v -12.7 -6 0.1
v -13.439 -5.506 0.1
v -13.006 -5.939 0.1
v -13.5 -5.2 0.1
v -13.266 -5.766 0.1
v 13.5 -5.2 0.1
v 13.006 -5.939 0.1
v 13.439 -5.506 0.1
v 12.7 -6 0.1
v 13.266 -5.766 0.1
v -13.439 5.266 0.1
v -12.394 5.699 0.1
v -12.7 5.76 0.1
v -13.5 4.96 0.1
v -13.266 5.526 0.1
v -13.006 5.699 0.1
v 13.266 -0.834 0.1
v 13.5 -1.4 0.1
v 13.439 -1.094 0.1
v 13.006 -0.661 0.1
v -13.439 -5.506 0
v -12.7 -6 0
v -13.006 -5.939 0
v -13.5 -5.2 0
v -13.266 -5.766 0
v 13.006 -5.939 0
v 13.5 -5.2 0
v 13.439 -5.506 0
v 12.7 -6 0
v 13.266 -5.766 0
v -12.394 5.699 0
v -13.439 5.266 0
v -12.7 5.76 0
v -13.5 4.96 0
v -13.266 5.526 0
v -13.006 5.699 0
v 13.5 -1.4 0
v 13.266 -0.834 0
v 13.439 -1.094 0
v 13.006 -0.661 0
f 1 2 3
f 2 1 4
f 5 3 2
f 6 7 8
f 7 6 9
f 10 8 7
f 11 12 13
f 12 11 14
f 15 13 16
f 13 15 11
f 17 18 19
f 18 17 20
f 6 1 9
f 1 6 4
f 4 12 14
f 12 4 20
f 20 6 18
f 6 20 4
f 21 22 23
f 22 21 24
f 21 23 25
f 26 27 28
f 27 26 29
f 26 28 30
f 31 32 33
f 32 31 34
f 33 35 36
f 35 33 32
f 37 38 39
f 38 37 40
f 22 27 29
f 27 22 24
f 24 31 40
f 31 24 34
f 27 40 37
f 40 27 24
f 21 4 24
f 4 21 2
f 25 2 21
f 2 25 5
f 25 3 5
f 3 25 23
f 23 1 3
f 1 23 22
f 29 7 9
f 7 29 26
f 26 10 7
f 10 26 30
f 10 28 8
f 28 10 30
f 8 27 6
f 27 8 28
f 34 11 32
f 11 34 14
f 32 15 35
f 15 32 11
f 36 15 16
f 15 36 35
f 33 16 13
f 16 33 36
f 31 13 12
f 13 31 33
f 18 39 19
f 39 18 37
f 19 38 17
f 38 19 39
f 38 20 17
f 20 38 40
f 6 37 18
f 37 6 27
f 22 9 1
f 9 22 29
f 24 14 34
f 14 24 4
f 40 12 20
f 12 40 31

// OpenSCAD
// file: ../p/5-16cyli.scad
use <../lib.scad>
function ldraw_lib__5_16cyli() = [
// 0 Cylinder 0.3125
// 0 Name: 5-16cyli.dat
// 0 Author: Philippe Hurbain [Philo]
// 0 !LDRAW_ORG Primitive UPDATE 2009-03
// 0 !LICENSE Licensed under CC BY 4.0 : see CAreadme.txt
// 
// 0 BFC CERTIFY CCW
  [0,"BFC","CERTIFY"],
  [0,"BFC","CCW"],
// 
// 0 !HISTORY 2009-12-29 [PTadmin] Official Update 2009-03
// 
// 
// 4 16 0.9239 0 0.3827 1 0 0 1 1 0 0.9239 1 0.3827
  [4,16,0.9239,0,0.3827,1,0,0,1,1,0,0.9239,1,0.3827],
// 4 16 0.7071 0 0.7071 0.9239 0 0.3827 0.9239 1 0.3827 0.7071 1 0.7071
  [4,16,0.7071,0,0.7071,0.9239,0,0.3827,0.9239,1,0.3827,0.7071,1,0.7071],
// 4 16 0.3827 0 0.9239 0.7071 0 0.7071 0.7071 1 0.7071 0.3827 1 0.9239
  [4,16,0.3827,0,0.9239,0.7071,0,0.7071,0.7071,1,0.7071,0.3827,1,0.9239],
// 4 16 0 0 1 0.3827 0 0.9239 0.3827 1 0.9239 0 1 1
  [4,16,0,0,1,0.3827,0,0.9239,0.3827,1,0.9239,0,1,1],
// 4 16 -0.3827 0 0.9239 0 0 1 0 1 1 -0.3827 1 0.9239
  [4,16,-0.3827,0,0.9239,0,0,1,0,1,1,-0.3827,1,0.9239],
// 
// 0 conditional lines
// 5 24 1 1 0 1 0 0 1 1 -0.4142 0.9239 1 0.3827
  [5,24,1,1,0,1,0,0,1,1,-0.4142,0.9239,1,0.3827],
// 5 24 0.9239 1 0.3827 0.9239 0 0.3827 1 1 0 0.7071 1 0.7071
  [5,24,0.9239,1,0.3827,0.9239,0,0.3827,1,1,0,0.7071,1,0.7071],
// 5 24 0.7071 1 0.7071 0.7071 0 0.7071 0.9239 1 0.3827 0.3827 1 0.9239
  [5,24,0.7071,1,0.7071,0.7071,0,0.7071,0.9239,1,0.3827,0.3827,1,0.9239],
// 5 24 0.3827 1 0.9239 0.3827 0 0.9239 0.7071 1 0.7071 0 1 1
  [5,24,0.3827,1,0.9239,0.3827,0,0.9239,0.7071,1,0.7071,0,1,1],
// 5 24 0 1 1 0 0 1 0.3827 1 0.9239 -0.3827 1 0.9239
  [5,24,0,1,1,0,0,1,0.3827,1,0.9239,-0.3827,1,0.9239],
// 5 24 -0.3827 1 0.9239 -0.3827 0 0.9239 0 1 1 -0.7654 1 0.7654
  [5,24,-0.3827,1,0.9239,-0.3827,0,0.9239,0,1,1,-0.7654,1,0.7654],
// 
// 0 end of file
// 
];
module ldraw_lib__5_16cyli(step=0, col=false, unit=2/5, alt=false, line=0.2, solid=!$preview)
    makepoly(ldraw_lib__5_16cyli(), step=step, col=col, unit=unit, alt=alt, line=line, solid=solid);
ldraw_lib__5_16cyli(line=0.2);
// file: ../p/5-16chrd.scad
use <../lib.scad>
function ldraw_lib__5_16chrd() = [
// 0 Chord 0.3125
// 0 Name: 5-16chrd.dat
// 0 Author: Niels Karsdorp [nielsk]
// 0 !LDRAW_ORG Primitive UPDATE 2010-01
// 0 !LICENSE Licensed under CC BY 4.0 : see CAreadme.txt
// 
// 0 BFC CERTIFY CCW
  [0,"BFC","CERTIFY"],
  [0,"BFC","CCW"],
// 
// 0 !HISTORY 2010-04-05 [PTadmin] Official Update 2010-01
// 
// 
// 4 16 1 0 0 0.9239 0 0.3827 0 0 1 -0.3827 0 0.9239
  [4,16,1,0,0,0.9239,0,0.3827,0,0,1,-0.3827,0,0.9239],
// 4 16 0.9239 0 0.3827 0.7071 0 0.7071 0.3827 0 0.9239 0 0 1
  [4,16,0.9239,0,0.3827,0.7071,0,0.7071,0.3827,0,0.9239,0,0,1],
// 0
// 
];
module ldraw_lib__5_16chrd(step=0, col=false, unit=2/5, alt=false, line=0.2, solid=!$preview)
    makepoly(ldraw_lib__5_16chrd(), step=step, col=col, unit=unit, alt=alt, line=line, solid=solid);
ldraw_lib__5_16chrd(line=0.2);
// file: ../p/3-16cyli.scad
use <../lib.scad>
function ldraw_lib__3_16cyli() = [
// 0 Cylinder 0.1875
// 0 Name: 3-16cyli.dat
// 0 Author: Mark Kennedy [mkennedy]
// 0 !LDRAW_ORG Primitive UPDATE 2005-01
// 0 !LICENSE Licensed under CC BY 4.0 : see CAreadme.txt
// 
// 0 BFC CERTIFY CCW
  [0,"BFC","CERTIFY"],
  [0,"BFC","CCW"],
// 
// 0 !HISTORY 2004-03-02 [PTadmin] Official Update 2004-01
// 0 !HISTORY 2004-12-11 [nielsk] Recreated using Primitive Generator, Edge lines fixed, BFC changed to CCW
// 0 !HISTORY 2005-12-28 [PTadmin] Official Update 2005-01
// 0 !HISTORY 2007-06-24 [PTadmin] Header formatted for Contributor Agreement
// 0 !HISTORY 2008-07-01 [PTadmin] Official Update 2008-01
// 
// 
// 4 16 .9239 1 .3827 .9239 0 .3827 1 0 0 1 1 0
  [4,16,.9239,1,.3827,.9239,0,.3827,1,0,0,1,1,0],
// 4 16 .7071 1 .7071 .7071 0 .7071 .9239 0 .3827 .9239 1 .3827
  [4,16,.7071,1,.7071,.7071,0,.7071,.9239,0,.3827,.9239,1,.3827],
// 4 16 .3827 1 .9239 .3827 0 .9239 .7071 0 .7071 .7071 1 .7071
  [4,16,.3827,1,.9239,.3827,0,.9239,.7071,0,.7071,.7071,1,.7071],
// 5 24 1 1 0 1 0 0 1 1 -.4142 .9239 1 .3827
  [5,24,1,1,0,1,0,0,1,1,-.4142,.9239,1,.3827],
// 5 24 .9239 1 .3827 .9239 0 .3827 1 1 0 .7071 1 .7071
  [5,24,.9239,1,.3827,.9239,0,.3827,1,1,0,.7071,1,.7071],
// 5 24 .7071 1 .7071 .7071 0 .7071 .9239 1 .3827 .3827 1 .9239
  [5,24,.7071,1,.7071,.7071,0,.7071,.9239,1,.3827,.3827,1,.9239],
// 5 24 .3827 1 .9239 .3827 0 .9239 .7071 1 .7071 0 1 1.0824
  [5,24,.3827,1,.9239,.3827,0,.9239,.7071,1,.7071,0,1,1.0824],
// 0
];
module ldraw_lib__3_16cyli(step=0, col=false, unit=2/5, alt=false, line=0.2, solid=!$preview)
    makepoly(ldraw_lib__3_16cyli(), step=step, col=col, unit=unit, alt=alt, line=line, solid=solid);
ldraw_lib__3_16cyli(line=0.2);
// file: ../p/3-16chrd.scad
use <../lib.scad>
function ldraw_lib__3_16chrd() = [
// 0 Chord 0.1875
// 0 Name: 3-16chrd.dat
// 0 Author: Niels Karsdorp [nielsk]
// 0 !LDRAW_ORG Primitive UPDATE 2009-01
// 0 !LICENSE Licensed under CC BY 4.0 : see CAreadme.txt
// 
// 0 BFC CERTIFY CCW
  [0,"BFC","CERTIFY"],
  [0,"BFC","CCW"],
// 
// 0 !HISTORY 2009-05-02 [PTadmin] Official Update 2009-01
// 
// 
// 4 16 1 0 0 0.9239 0 0.3827 0.7071 0 0.7071 0.3827 0 0.9239
  [4,16,1,0,0,0.9239,0,0.3827,0.7071,0,0.7071,0.3827,0,0.9239],
// 0
// 
];
module ldraw_lib__3_16chrd(step=0, col=false, unit=2/5, alt=false, line=0.2, solid=!$preview)
    makepoly(ldraw_lib__3_16chrd(), step=step, col=col, unit=unit, alt=alt, line=line, solid=solid);
ldraw_lib__3_16chrd(line=0.2);
// file: ../p/1-4cyli.scad
use <../lib.scad>
function ldraw_lib__1_4cyli() = [
// 0 Cylinder 0.25
// 0 Name: 1-4cyli.dat
// 0 Author: James Jessiman
// 0 !LDRAW_ORG Primitive UPDATE 2012-01
// 0 !LICENSE Licensed under CC BY 4.0 : see CAreadme.txt
// 
// 0 BFC CERTIFY CCW
  [0,"BFC","CERTIFY"],
  [0,"BFC","CCW"],
// 
// 0 !HISTORY 2002-03-23 [sbliss] Added BFC statement.
// 0 !HISTORY 2002-04-25 [PTadmin] Official Update 2002-02
// 0 !HISTORY 2007-06-22 [PTadmin] Header formatted for Contributor Agreement
// 0 !HISTORY 2008-07-01 [PTadmin] Official Update 2008-01
// 0 !HISTORY 2012-02-16 [Philo] Changed to CCW
// 0 !HISTORY 2012-03-30 [PTadmin] Official Update 2012-01
// 
// 
// 4 16 1 1 0 0.9239 1 0.3827 0.9239 0 0.3827 1 0 0
  [4,16,1,1,0,0.9239,1,0.3827,0.9239,0,0.3827,1,0,0],
// 5 24 1 0 0 1 1 0 0.9239 0 0.3827 1 0 -1
  [5,24,1,0,0,1,1,0,0.9239,0,0.3827,1,0,-1],
// 4 16 0.9239 1 0.3827 0.7071 1 0.7071 0.7071 0 0.7071 0.9239 0 0.3827
  [4,16,0.9239,1,0.3827,0.7071,1,0.7071,0.7071,0,0.7071,0.9239,0,0.3827],
// 5 24 0.9239 0 0.3827 0.9239 1 0.3827 0.7071 0 0.7071 1 0 0
  [5,24,0.9239,0,0.3827,0.9239,1,0.3827,0.7071,0,0.7071,1,0,0],
// 4 16 0.7071 1 0.7071 0.3827 1 0.9239 0.3827 0 0.9239 0.7071 0 0.7071
  [4,16,0.7071,1,0.7071,0.3827,1,0.9239,0.3827,0,0.9239,0.7071,0,0.7071],
// 5 24 0.7071 0 0.7071 0.7071 1 0.7071 0.3827 0 0.9239 0.9239 0 0.3827
  [5,24,0.7071,0,0.7071,0.7071,1,0.7071,0.3827,0,0.9239,0.9239,0,0.3827],
// 4 16 0.3827 1 0.9239 0 1 1 0 0 1 0.3827 0 0.9239
  [4,16,0.3827,1,0.9239,0,1,1,0,0,1,0.3827,0,0.9239],
// 5 24 0.3827 0 0.9239 0.3827 1 0.9239 0 0 1 0.7071 0 0.7071
  [5,24,0.3827,0,0.9239,0.3827,1,0.9239,0,0,1,0.7071,0,0.7071],
// 5 24 0 0 1 0 1 1 0.3827 0 0.9239 -1 0 1
  [5,24,0,0,1,0,1,1,0.3827,0,0.9239,-1,0,1],
];
module ldraw_lib__1_4cyli(step=0, col=false, unit=2/5, alt=false, line=0.2, solid=!$preview)
    makepoly(ldraw_lib__1_4cyli(), step=step, col=col, unit=unit, alt=alt, line=line, solid=solid);
ldraw_lib__1_4cyli(line=0.2);
// file: ../p/1-4chrd.scad
use <../lib.scad>
function ldraw_lib__1_4chrd() = [
// 0 Chord 0.25
// 0 Name: 1-4chrd.dat
// 0 Author: Max Martin Richter [MMR1988]
// 0 !LDRAW_ORG Primitive UPDATE 2023-05
// 0 !LICENSE Licensed under CC BY 4.0 : see CAreadme.txt
// 
// 0 BFC CERTIFY CCW
  [0,"BFC","CERTIFY"],
  [0,"BFC","CCW"],
// 
// 0 !HISTORY 2004-04-22 [PTadmin] Official Update 2004-02
// 0 !HISTORY 2007-10-09 [PTadmin] Header formatted for Contributor Agreement
// 0 !HISTORY 2008-07-01 [PTadmin] Official Update 2008-01
// 0 !HISTORY 2012-08-02 [MMR1988] Re-creation with PrimGen2 and Rectifier
// 0 !HISTORY 2012-08-09 [PTadmin] Official Update 2012-02
// 0 !HISTORY 2023-10-27 [OrionP] Change author to MMR1988 from hafhead
// 0 !HISTORY 2023-10-31 [OrionP] Official Update 2023-05
// 
// 4 16 0.9239 0 0.3827 0.3827 0 0.9239 0 0 1 1 0 0
  [4,16,0.9239,0,0.3827,0.3827,0,0.9239,0,0,1,1,0,0],
// 3 16 0.7071 0 0.7071 0.3827 0 0.9239 0.9239 0 0.3827
  [3,16,0.7071,0,0.7071,0.3827,0,0.9239,0.9239,0,0.3827],
];
module ldraw_lib__1_4chrd(step=0, col=false, unit=2/5, alt=false, line=0.2, solid=!$preview)
    makepoly(ldraw_lib__1_4chrd(), step=step, col=col, unit=unit, alt=alt, line=line, solid=solid);
ldraw_lib__1_4chrd(line=0.2);
// main file
use <../lib.scad>
use <../p/1-4chrd.scad>
use <../p/1-4cyli.scad>
use <../p/3-16chrd.scad>
use <../p/3-16cyli.scad>
use <../p/5-16chrd.scad>
use <../p/5-16cyli.scad>
function ldraw_lib__4221407d() = [
// 0 Sticker  1.5 x  3.3 Trapezoid Yellow Left
// 0 Name: 4221407d.dat
// 0 Author: Evert-Jan Boer [ejboer]
// 0 !LDRAW_ORG Part UPDATE 2024-08
// 0 !LICENSE Licensed under CC BY 4.0 : see CAreadme.txt
// 
// 0 BFC CERTIFY CCW
  [0,"BFC","CERTIFY"],
  [0,"BFC","CCW"],
// 
// 0 !KEYWORDS Set 10134, Star Wars, Y-Wing Starfighter
// 
// 0 !HISTORY 2024-09-30 [OrionP] Official Update 2024-08
// 
// 1 14 -31.75 -.25 -13 -2 0 0 0 1 0 0 0 -2 1-4chrd.dat
  [1,14,-31.75,-.25,-13,-2,0,0,0,1,0,0,0,-2, ldraw_lib__1_4chrd()],
// 1 14 31.75 -.25 -13 0 0 2 0 1 0 -2 0 0 1-4chrd.dat
  [1,14,31.75,-.25,-13,0,0,2,0,1,0,-2,0,0, ldraw_lib__1_4chrd()],
// 1 14 -31.75 -.25 12.4 -2 0 0 0 1 0 0 0 2 5-16chrd.dat
  [1,14,-31.75,-.25,12.4,-2,0,0,0,1,0,0,0,2, ldraw_lib__5_16chrd()],
// 1 14 31.75 -.25 -3.5 2 0 0 0 1 0 0 0 2 3-16chrd.dat
  [1,14,31.75,-.25,-3.5,2,0,0,0,1,0,0,0,2, ldraw_lib__3_16chrd()],
// 4 14 -31.75 -.25 -15 31.75 -.25 -15 33.75 -.25 -13 -33.75 -.25 -13
  [4,14,-31.75,-.25,-15,31.75,-.25,-15,33.75,-.25,-13,-33.75,-.25,-13],
// 4 14 32.5154 -.25 -1.6522 -30.9846 -.25 14.2478 -33.75 -.25 12.4 -33.75 -.25 -13
  [4,14,32.5154,-.25,-1.6522,-30.9846,-.25,14.2478,-33.75,-.25,12.4,-33.75,-.25,-13],
// 4 14 33.75 -.25 -3.5 32.5154 -.25 -1.6522 -33.75 -.25 -13 33.75 -.25 -13
  [4,14,33.75,-.25,-3.5,32.5154,-.25,-1.6522,-33.75,-.25,-13,33.75,-.25,-13],
// 
// 1 16 -31.75 0 -13 -2 0 0 0 -1 0 0 0 -2 1-4chrd.dat
  [1,16,-31.75,0,-13,-2,0,0,0,-1,0,0,0,-2, ldraw_lib__1_4chrd()],
// 1 16 31.75 0 -13 0 0 2 0 -1 0 -2 0 0 1-4chrd.dat
  [1,16,31.75,0,-13,0,0,2,0,-1,0,-2,0,0, ldraw_lib__1_4chrd()],
// 1 16 -31.75 0 12.4 -2 0 0 0 -1 0 0 0 2 5-16chrd.dat
  [1,16,-31.75,0,12.4,-2,0,0,0,-1,0,0,0,2, ldraw_lib__5_16chrd()],
// 1 16 31.75 0 -3.5 2 0 0 0 -1 0 0 0 2 3-16chrd.dat
  [1,16,31.75,0,-3.5,2,0,0,0,-1,0,0,0,2, ldraw_lib__3_16chrd()],
// 4 16 33.75 0 -13 31.75 0 -15 -31.75 0 -15 -33.75 0 -13
  [4,16,33.75,0,-13,31.75,0,-15,-31.75,0,-15,-33.75,0,-13],
// 4 16 32.5154 0 -1.6522 -33.75 0 -13 -33.75 0 12.4 -30.9846 0 14.2478
  [4,16,32.5154,0,-1.6522,-33.75,0,-13,-33.75,0,12.4,-30.9846,0,14.2478],
// 4 16 -33.75 0 -13 32.5154 0 -1.6522 33.75 0 -3.5 33.75 0 -13
  [4,16,-33.75,0,-13,32.5154,0,-1.6522,33.75,0,-3.5,33.75,0,-13],
// 
// 1 16 -31.75 -.25 -13 -2 0 0 0 .25 0 0 0 -2 1-4cyli.dat
  [1,16,-31.75,-.25,-13,-2,0,0,0,.25,0,0,0,-2, ldraw_lib__1_4cyli()],
// 1 16 31.75 -.25 -13 0 0 2 0 .25 0 -2 0 0 1-4cyli.dat
  [1,16,31.75,-.25,-13,0,0,2,0,.25,0,-2,0,0, ldraw_lib__1_4cyli()],
// 1 16 -31.75 -.25 12.4 -2 0 0 0 .25 0 0 0 2 5-16cyli.dat
  [1,16,-31.75,-.25,12.4,-2,0,0,0,.25,0,0,0,2, ldraw_lib__5_16cyli()],
// 1 16 31.75 -.25 -3.5 2 0 0 0 .25 0 0 0 2 3-16cyli.dat
  [1,16,31.75,-.25,-3.5,2,0,0,0,.25,0,0,0,2, ldraw_lib__3_16cyli()],
// 4 16 33.75 0 -3.5 33.75 -.25 -3.5 33.75 -.25 -13 33.75 0 -13
  [4,16,33.75,0,-3.5,33.75,-.25,-3.5,33.75,-.25,-13,33.75,0,-13],
// 4 16 31.75 0 -15 31.75 -.25 -15 -31.75 -.25 -15 -31.75 0 -15
  [4,16,31.75,0,-15,31.75,-.25,-15,-31.75,-.25,-15,-31.75,0,-15],
// 4 16 -33.75 0 -13 -33.75 -.25 -13 -33.75 -.25 12.4 -33.75 0 12.4
  [4,16,-33.75,0,-13,-33.75,-.25,-13,-33.75,-.25,12.4,-33.75,0,12.4],
// 4 16 -30.9846 0 14.2478 -30.9846 -.25 14.2478 32.5154 -.25 -1.6522 32.5154 0 -1.6522
  [4,16,-30.9846,0,14.2478,-30.9846,-.25,14.2478,32.5154,-.25,-1.6522,32.5154,0,-1.6522],
];
module ldraw_lib__4221407d(step=0, col=false, unit=2/5, alt=false, line=0.2, solid=!$preview)
    makepoly(ldraw_lib__4221407d(), step=step, col=col, unit=unit, alt=alt, line=line, solid=solid);
ldraw_lib__4221407d(line=0.2);
